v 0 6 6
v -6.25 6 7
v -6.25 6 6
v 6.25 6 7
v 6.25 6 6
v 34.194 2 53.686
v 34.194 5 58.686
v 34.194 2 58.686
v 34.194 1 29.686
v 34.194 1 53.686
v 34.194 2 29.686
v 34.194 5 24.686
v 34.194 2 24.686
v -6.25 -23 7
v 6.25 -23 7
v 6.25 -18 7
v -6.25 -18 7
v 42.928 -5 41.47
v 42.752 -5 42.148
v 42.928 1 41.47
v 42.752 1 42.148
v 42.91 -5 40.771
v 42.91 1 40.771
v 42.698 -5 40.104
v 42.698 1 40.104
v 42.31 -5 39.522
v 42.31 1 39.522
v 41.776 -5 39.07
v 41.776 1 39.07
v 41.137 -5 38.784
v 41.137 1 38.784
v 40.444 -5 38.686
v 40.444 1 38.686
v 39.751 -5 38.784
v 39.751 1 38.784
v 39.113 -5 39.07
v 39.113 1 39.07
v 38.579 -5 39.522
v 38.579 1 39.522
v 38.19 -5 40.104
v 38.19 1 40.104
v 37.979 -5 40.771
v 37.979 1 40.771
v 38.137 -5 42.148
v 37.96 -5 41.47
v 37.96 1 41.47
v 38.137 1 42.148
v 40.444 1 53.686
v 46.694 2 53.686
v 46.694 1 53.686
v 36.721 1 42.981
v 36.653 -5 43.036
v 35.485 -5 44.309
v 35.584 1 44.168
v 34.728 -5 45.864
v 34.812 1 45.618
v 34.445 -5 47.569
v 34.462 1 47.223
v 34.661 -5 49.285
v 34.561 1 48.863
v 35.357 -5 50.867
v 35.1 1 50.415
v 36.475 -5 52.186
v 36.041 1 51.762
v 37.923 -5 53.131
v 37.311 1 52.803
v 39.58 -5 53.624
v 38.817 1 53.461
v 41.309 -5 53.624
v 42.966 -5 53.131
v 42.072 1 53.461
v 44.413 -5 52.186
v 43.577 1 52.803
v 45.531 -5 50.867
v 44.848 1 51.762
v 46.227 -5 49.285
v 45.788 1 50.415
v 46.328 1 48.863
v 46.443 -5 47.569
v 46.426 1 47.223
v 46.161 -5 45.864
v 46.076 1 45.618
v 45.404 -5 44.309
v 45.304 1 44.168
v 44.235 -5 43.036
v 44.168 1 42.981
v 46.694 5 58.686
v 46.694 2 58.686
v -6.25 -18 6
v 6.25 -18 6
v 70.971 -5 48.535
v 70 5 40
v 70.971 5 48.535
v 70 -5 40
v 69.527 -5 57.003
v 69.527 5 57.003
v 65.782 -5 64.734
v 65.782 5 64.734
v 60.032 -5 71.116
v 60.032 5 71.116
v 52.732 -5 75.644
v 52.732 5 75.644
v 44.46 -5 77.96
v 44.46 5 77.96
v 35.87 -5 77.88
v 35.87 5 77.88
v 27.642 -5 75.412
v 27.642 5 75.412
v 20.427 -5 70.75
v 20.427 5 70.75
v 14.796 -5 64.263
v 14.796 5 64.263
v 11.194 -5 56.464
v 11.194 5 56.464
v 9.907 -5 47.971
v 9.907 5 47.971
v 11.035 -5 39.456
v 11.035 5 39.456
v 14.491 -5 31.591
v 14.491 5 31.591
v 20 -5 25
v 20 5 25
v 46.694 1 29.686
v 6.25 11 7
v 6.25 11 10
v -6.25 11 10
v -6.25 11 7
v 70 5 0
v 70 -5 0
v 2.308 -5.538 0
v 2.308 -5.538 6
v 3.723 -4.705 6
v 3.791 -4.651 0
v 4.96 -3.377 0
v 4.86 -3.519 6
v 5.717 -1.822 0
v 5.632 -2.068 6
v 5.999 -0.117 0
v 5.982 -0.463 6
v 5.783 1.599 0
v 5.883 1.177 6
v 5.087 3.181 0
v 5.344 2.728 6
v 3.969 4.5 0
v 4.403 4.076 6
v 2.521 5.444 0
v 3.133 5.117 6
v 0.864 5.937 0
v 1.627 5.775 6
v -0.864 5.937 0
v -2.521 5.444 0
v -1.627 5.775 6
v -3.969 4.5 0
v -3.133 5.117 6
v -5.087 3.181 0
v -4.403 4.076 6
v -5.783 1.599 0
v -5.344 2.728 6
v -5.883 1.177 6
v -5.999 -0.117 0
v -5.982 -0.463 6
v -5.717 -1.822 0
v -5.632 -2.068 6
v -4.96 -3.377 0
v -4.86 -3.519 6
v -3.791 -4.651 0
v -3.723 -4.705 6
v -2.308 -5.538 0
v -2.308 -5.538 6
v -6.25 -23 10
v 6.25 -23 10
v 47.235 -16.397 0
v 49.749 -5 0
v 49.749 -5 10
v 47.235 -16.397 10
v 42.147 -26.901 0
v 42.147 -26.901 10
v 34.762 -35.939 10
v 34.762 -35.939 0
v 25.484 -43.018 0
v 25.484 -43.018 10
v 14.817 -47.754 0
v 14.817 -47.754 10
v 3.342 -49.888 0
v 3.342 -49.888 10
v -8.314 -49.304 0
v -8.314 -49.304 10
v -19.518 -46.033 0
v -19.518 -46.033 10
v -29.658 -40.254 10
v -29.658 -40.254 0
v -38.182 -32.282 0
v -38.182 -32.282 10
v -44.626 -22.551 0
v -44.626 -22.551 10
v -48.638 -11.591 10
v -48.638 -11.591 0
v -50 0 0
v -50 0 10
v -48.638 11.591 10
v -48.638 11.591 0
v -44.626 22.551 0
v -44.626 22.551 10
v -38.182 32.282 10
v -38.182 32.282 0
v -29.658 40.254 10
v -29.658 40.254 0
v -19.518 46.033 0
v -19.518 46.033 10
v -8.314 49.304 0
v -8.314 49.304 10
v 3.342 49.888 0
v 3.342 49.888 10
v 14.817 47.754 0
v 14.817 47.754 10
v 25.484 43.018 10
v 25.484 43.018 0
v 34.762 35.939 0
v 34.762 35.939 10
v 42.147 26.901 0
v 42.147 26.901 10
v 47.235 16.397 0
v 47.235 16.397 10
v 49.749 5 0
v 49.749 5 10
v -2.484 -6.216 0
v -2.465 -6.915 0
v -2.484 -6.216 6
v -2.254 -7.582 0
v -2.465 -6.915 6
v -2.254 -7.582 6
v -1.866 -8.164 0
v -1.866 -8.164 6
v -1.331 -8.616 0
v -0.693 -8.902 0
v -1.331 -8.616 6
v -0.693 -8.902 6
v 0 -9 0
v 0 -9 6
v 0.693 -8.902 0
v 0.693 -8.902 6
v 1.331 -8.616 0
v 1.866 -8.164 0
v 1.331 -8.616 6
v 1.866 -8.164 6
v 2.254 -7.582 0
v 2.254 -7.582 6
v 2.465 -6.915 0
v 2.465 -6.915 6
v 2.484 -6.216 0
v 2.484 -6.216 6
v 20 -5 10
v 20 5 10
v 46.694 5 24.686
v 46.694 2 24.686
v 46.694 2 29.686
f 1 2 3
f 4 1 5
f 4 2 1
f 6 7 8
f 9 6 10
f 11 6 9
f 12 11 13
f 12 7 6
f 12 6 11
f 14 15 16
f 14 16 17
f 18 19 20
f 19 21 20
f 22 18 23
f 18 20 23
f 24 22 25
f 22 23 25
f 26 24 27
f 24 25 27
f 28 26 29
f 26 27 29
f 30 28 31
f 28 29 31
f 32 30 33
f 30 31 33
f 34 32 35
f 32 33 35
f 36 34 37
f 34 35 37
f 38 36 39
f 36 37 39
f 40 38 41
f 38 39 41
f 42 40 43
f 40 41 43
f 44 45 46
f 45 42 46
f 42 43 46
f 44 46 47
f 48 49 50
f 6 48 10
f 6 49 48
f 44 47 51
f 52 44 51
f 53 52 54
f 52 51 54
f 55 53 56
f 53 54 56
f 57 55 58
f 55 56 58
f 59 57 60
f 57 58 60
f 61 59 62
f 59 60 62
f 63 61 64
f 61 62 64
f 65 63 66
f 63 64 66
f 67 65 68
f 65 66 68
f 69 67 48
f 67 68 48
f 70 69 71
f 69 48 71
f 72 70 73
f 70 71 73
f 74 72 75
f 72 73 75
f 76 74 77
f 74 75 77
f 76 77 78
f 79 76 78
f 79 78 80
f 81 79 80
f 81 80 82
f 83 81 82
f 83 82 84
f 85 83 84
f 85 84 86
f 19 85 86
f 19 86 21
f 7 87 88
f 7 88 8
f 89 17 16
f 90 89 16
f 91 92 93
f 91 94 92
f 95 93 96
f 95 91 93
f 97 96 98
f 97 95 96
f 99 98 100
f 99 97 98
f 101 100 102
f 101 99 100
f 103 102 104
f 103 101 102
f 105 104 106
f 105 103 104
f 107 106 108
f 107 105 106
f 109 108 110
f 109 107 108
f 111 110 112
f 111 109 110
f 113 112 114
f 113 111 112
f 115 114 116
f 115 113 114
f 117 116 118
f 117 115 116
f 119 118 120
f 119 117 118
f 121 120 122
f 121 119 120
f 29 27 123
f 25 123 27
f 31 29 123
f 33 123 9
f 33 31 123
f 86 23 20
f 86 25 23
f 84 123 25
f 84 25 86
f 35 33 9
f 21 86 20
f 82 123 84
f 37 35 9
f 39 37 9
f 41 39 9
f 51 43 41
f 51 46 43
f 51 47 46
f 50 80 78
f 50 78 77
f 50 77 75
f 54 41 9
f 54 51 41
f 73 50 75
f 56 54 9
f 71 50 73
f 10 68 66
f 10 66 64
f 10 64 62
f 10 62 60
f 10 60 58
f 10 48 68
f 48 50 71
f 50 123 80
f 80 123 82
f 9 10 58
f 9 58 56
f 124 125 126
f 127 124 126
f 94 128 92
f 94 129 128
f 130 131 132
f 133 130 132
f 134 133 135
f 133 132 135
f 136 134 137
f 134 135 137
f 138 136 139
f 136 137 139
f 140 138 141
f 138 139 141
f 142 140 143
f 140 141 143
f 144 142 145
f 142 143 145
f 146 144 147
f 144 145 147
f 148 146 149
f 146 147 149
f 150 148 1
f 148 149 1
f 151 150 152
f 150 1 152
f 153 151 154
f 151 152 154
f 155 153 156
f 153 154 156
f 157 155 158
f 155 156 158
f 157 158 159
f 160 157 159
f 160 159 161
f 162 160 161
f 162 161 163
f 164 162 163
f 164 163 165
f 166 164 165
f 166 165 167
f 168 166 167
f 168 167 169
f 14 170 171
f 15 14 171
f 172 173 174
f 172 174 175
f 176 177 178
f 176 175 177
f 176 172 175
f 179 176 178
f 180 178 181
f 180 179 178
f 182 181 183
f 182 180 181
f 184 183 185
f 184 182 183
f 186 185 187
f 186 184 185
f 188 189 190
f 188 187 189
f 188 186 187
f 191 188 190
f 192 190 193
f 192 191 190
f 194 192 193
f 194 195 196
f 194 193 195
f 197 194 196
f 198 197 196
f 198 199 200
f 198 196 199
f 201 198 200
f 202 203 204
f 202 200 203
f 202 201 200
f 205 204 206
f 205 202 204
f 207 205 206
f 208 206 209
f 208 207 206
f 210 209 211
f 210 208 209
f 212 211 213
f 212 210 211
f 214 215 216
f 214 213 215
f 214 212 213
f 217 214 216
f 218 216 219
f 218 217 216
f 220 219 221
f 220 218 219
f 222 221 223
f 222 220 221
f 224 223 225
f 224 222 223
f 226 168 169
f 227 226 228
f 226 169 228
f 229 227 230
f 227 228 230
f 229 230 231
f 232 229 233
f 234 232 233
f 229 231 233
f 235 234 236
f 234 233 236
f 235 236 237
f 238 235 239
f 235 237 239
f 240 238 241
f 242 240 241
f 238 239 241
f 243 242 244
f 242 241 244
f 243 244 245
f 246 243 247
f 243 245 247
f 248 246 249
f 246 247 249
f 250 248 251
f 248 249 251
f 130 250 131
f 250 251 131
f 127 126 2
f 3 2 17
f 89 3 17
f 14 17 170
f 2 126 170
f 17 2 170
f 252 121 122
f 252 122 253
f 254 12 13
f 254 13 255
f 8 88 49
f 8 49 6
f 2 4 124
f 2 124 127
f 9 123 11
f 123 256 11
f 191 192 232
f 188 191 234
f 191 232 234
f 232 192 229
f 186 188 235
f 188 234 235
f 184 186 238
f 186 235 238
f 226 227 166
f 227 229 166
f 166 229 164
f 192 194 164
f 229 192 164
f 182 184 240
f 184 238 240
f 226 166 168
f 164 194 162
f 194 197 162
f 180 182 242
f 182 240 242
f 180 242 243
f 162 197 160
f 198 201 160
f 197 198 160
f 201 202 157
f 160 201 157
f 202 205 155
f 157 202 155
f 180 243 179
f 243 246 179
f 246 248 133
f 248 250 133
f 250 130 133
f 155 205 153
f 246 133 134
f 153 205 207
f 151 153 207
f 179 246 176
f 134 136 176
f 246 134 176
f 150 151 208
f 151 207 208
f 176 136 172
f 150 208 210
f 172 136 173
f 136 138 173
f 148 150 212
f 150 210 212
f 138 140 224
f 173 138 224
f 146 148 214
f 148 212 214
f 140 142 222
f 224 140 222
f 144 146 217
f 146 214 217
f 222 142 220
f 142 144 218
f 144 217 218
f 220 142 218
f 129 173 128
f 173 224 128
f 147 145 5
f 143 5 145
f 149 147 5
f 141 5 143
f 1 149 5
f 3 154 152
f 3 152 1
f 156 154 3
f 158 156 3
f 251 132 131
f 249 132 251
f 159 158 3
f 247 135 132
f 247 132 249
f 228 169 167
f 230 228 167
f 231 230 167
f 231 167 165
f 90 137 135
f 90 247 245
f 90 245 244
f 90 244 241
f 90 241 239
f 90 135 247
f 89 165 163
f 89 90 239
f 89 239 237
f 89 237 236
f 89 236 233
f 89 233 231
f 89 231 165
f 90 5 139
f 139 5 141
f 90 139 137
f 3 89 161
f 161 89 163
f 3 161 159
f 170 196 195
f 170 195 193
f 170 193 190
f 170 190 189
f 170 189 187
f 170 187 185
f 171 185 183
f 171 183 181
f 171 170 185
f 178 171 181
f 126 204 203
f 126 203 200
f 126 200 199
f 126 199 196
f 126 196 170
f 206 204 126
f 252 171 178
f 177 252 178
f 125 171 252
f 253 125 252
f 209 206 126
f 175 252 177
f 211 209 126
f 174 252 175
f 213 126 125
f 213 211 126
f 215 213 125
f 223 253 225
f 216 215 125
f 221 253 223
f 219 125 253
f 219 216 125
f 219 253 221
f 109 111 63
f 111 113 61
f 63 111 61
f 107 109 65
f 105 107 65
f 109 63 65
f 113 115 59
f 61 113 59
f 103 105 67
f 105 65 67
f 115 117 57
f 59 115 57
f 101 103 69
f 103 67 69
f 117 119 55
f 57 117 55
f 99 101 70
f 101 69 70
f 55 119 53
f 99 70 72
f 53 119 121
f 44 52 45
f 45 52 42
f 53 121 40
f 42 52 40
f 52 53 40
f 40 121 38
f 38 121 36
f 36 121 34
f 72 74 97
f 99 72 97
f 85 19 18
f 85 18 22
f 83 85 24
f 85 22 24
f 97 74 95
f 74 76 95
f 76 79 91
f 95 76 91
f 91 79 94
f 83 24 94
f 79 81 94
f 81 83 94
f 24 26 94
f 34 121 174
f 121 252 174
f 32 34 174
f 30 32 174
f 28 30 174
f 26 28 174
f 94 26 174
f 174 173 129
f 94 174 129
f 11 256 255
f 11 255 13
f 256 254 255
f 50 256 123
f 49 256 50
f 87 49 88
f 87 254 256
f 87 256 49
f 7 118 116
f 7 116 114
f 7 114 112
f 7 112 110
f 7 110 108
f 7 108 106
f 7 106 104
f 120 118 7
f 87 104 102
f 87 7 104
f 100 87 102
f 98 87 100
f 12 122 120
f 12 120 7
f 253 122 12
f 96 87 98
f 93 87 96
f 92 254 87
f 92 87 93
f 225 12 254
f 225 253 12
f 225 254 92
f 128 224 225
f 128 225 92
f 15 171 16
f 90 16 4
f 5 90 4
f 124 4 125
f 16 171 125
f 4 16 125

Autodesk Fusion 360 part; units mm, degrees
sketch "Sketch1" plane through (0, 0, 0) normal (0, 0, 1) x (1, 0, 0)
  circle A0 centre (0, 0) radius 50
  dimension "d1" = 100
extrude "Extrude1" add sketch "Sketch1" along normal blind 10
sketch "Sketch2" plane through (0, 0, 10) normal (0, 0, 1) x (-1, 0, 0)
  circle A0 centre (0, 0) radius 50
  line L0 (-6.25, -11) -> (6.25, -11)
  line L1 (6.25, -11) -> (6.25, 23)
  line L2 (6.25, 23) -> (-6.25, 23)
  line L3 (-6.25, 23) -> (-6.25, -11)
  line L4 (-6.25, -11) -> (6.25, 23) construction
  line L5 (6.25, -11) -> (-6.25, 23) construction
  line L6 (6.25, -6) -> (-6.25, -6)
  line L7 (6.25, 18) -> (-6.25, 18)
  point P0 (0, 6)
  point P1 (0, 6)
  dimension "d4" = 6
  dimension "d5" = 12.5
  dimension "d6" = 34
  dimension "d7" = 5
  dimension "d8" = 5
extrude "Extrude2" cut sketch "Sketch2" against normal blind 3 contours L0 L1 L3 L6 | L1 L3 L6 L7 | L1 L2 L3 L7
sketch "Sketch3" plane through (0, 0, 7) normal (0, 0, 1) x (-1, 0, 0)
  line L0 (-6.25, 23) -> (-6.25, -11)
  line L1 (-6.25, -11) -> (6.25, -11)
  line L2 (6.25, -11) -> (6.25, 23)
  line L3 (6.25, 23) -> (-6.25, 23)
  line L4 (6.25, -6) -> (-6.25, -6)
  line L5 (6.25, 18) -> (-6.25, 18)
  dimension "d11" = 5
  dimension "d12" = 5
extrude "Extrude3" cut sketch "Sketch3" against normal blind 1 contours L0 L2 L4 L5
sketch "Sketch4" plane through (0, 0, 6) normal (0, 0, 1) x (-1, 0, 0)
  line L0 (6.25, -6) -> (6.25, 18)
  line L1 (6.25, 18) -> (-6.25, 18)
  line L2 (-6.25, 18) -> (-6.25, -6)
  line L3 (-6.25, -6) -> (6.25, -6)
  circle A0 centre (0, 0) radius 6
  circle A1 centre (0, 6.5) radius 2.5
  dimension "d15" = 12
  dimension "d16" = 5
  dimension "d17" = 6.5
extrude "Extrude4" cut sketch "Sketch4" against normal blind 6 contours A0 A1 | A0 A1 | A0 A1
sketch "Sketch5" plane through (0, 0, 7) normal (0, 0, 1) x (-1, 0, 0)
  line L0 (-6.25, 18) -> (6.25, 18)
  line L1 (6.25, 18) -> (6.25, 23)
  line L2 (6.25, 23) -> (-6.25, 23)
  line L3 (-6.25, 23) -> (-6.25, 18)
  circle A0 centre (0, 20.5) radius 1.25
  dimension "d20" = 2.5
  dimension "d21" = 2.5
sketch "Sketch6" plane through (0, 0, 7) normal (0, 0, 1) x (-1, 0, 0)
  line L0 (6.25, -6) -> (-6.25, -6)
  line L1 (-6.25, -6) -> (-6.25, -11)
  line L2 (-6.25, -11) -> (6.25, -11)
  line L3 (6.25, -11) -> (6.25, -6)
  circle A0 centre (0, -8.5) radius 1.25
  dimension "d22" = 2.5
  dimension "d23" = 2.5
extrude "Extrude5" cut sketch "Sketch6" along normal through all contours A0
extrude "Extrude6" cut sketch "Sketch5" along normal through all contours A0
thread "Thread1" thread offset 0 thread length 10
thread "Thread2" thread offset 0 thread length 10
sketch "Sketch7" plane through (0, 0, 0) normal (0, 1, 0) x (1, 0, 0)
  line L0 (20, 0) -> (70, 0)
  line L1 (70, 0) -> (70, -40)
  arc A0 (20, -25) -> (70, -40) centre (40.4442, -47.6861) ccw
  line L2 (20, -25) -> (20, 0)
  dimension "d30" = 50
  dimension "d31" = 40
  dimension "d32" = 20
extrude "Extrude7" add sketch "Sketch7" along normal mid plane 10
sketch "Sketch8" plane through (0, 5, 0) normal (0, 1, 0) x (-1, 0, 0)
  line L0 (-49.7494, 10) -> (-20, 10)
  line L1 (-20, 10) -> (-20, 25)
  arc A0 (-20, 25) -> (-70, 40) centre (-40.4442, 47.6861) ccw
  line L2 (-70, 40) -> (-70, 0)
  line L3 (-70, 0) -> (-49.7494, 0)
  line L4 (-49.7494, 0) -> (-49.7494, 10)
  line L5 (-34.1942, 24.6861) -> (-46.6942, 24.6861)
  line L6 (-46.6942, 24.6861) -> (-46.6942, 58.6861)
  line L7 (-46.6942, 58.6861) -> (-34.1942, 58.6861)
  line L8 (-34.1942, 58.6861) -> (-34.1942, 24.6861)
  line L9 (-34.1942, 24.6861) -> (-46.6942, 58.6861) construction
  line L10 (-46.6942, 24.6861) -> (-34.1942, 58.6861) construction
  point P0 (-40.4442, 47.6861)
  point P1 (-40.4442, 41.6861)
  point P2 (-40.4442, 41.6861)
  dimension "d35" = 6
  dimension "d36" = 12.5
  dimension "d37" = 34
extrude "Extrude8" cut sketch "Sketch8" against normal blind 3 contours L5 L6 L7 L8
sketch "Sketch9" plane through (0, 2, 0) normal (0, 1, 0) x (-1, 0, 0)
  line L0 (-34.1942, 58.6861) -> (-46.6942, 58.6861)
  line L1 (-46.6942, 58.6861) -> (-46.6942, 24.6861)
  line L2 (-46.6942, 24.6861) -> (-34.1942, 24.6861)
  line L3 (-34.1942, 24.6861) -> (-34.1942, 58.6861)
  line L4 (-46.6942, 53.6861) -> (-34.1942, 53.6861)
  line L5 (-46.6942, 29.6861) -> (-34.1942, 29.6861)
  dimension "d40" = 5
  dimension "d41" = 5
extrude "Extrude9" cut sketch "Sketch9" against normal blind 1 contours L1 L3 L4 L5
sketch "Sketch10" plane through (0, 1, 0) normal (0, 1, 0) x (-1, 0, 0)
  line L0 (-46.6942, 53.6861) -> (-46.6942, 29.6861)
  line L1 (-46.6942, 29.6861) -> (-34.1942, 29.6861)
  line L2 (-34.1942, 29.6861) -> (-34.1942, 53.6861)
  line L3 (-34.1942, 53.6861) -> (-46.6942, 53.6861)
  circle A0 centre (-40.4442, 47.6861) radius 6
  circle A1 centre (-40.4442, 41.1861) radius 2.5
  dimension "d44" = 12
  dimension "d45" = 5
  dimension "d46" = 6.5
extrude "Extrude10" cut sketch "Sketch10" against normal blind 6 contours A0 A1 | A0 A1 | A0 A1
sketch "Sketch11" plane through (0, 2, 0) normal (0, 1, 0) x (-1, 0, 0)
  line L0 (-34.1942, 29.6861) -> (-46.6942, 29.6861)
  line L1 (-46.6942, 29.6861) -> (-46.6942, 24.6861)
  line L2 (-46.6942, 24.6861) -> (-34.1942, 24.6861)
  line L3 (-34.1942, 24.6861) -> (-34.1942, 29.6861)
  circle A0 centre (-40.4442, 27.1861) radius 1.25
  dimension "d49" = 2.5
  dimension "d50" = 2.5
sketch "Sketch12" plane through (0, 2, 0) normal (0, 1, 0) x (-1, 0, 0)
  line L0 (-46.6942, 53.6861) -> (-34.1942, 53.6861)
  line L1 (-34.1942, 53.6861) -> (-34.1942, 58.6861)
  line L2 (-34.1942, 58.6861) -> (-46.6942, 58.6861)
  line L3 (-46.6942, 58.6861) -> (-46.6942, 53.6861)
  circle A0 centre (-40.4442, 56.1861) radius 1.25
  dimension "d51" = 2.5
  dimension "d52" = 2.5
extrude "Extrude11" cut sketch "Sketch12" along normal through all contours A0
extrude "Extrude12" cut sketch "Sketch11" along normal through all contours A0
thread "Thread3" thread offset 0 thread length 10
sketch "Sketch13" plane through (0, 5, 0) normal (0, 1, 0) x (-1, 0, 0)
  line L0 (-46.6942, 24.6861) -> (-46.6942, 58.6861)
  line L1 (-46.6942, 58.6861) -> (-34.1942, 58.6861)
  line L2 (-34.1942, 58.6861) -> (-34.1942, 24.6861)
  line L3 (-34.1942, 24.6861) -> (-46.6942, 24.6861)
  line L4 (-49.7494, 10) -> (-20, 10)
  line L5 (-20, 10) -> (-20, 25)
  arc A0 (-20, 25) -> (-70, 40) centre (-40.4442, 47.6861) ccw
  line L6 (-70, 40) -> (-70, 0)
  line L7 (-70, 0) -> (-49.7494, 0)
  line L8 (-49.7494, 0) -> (-49.7494, 10)
